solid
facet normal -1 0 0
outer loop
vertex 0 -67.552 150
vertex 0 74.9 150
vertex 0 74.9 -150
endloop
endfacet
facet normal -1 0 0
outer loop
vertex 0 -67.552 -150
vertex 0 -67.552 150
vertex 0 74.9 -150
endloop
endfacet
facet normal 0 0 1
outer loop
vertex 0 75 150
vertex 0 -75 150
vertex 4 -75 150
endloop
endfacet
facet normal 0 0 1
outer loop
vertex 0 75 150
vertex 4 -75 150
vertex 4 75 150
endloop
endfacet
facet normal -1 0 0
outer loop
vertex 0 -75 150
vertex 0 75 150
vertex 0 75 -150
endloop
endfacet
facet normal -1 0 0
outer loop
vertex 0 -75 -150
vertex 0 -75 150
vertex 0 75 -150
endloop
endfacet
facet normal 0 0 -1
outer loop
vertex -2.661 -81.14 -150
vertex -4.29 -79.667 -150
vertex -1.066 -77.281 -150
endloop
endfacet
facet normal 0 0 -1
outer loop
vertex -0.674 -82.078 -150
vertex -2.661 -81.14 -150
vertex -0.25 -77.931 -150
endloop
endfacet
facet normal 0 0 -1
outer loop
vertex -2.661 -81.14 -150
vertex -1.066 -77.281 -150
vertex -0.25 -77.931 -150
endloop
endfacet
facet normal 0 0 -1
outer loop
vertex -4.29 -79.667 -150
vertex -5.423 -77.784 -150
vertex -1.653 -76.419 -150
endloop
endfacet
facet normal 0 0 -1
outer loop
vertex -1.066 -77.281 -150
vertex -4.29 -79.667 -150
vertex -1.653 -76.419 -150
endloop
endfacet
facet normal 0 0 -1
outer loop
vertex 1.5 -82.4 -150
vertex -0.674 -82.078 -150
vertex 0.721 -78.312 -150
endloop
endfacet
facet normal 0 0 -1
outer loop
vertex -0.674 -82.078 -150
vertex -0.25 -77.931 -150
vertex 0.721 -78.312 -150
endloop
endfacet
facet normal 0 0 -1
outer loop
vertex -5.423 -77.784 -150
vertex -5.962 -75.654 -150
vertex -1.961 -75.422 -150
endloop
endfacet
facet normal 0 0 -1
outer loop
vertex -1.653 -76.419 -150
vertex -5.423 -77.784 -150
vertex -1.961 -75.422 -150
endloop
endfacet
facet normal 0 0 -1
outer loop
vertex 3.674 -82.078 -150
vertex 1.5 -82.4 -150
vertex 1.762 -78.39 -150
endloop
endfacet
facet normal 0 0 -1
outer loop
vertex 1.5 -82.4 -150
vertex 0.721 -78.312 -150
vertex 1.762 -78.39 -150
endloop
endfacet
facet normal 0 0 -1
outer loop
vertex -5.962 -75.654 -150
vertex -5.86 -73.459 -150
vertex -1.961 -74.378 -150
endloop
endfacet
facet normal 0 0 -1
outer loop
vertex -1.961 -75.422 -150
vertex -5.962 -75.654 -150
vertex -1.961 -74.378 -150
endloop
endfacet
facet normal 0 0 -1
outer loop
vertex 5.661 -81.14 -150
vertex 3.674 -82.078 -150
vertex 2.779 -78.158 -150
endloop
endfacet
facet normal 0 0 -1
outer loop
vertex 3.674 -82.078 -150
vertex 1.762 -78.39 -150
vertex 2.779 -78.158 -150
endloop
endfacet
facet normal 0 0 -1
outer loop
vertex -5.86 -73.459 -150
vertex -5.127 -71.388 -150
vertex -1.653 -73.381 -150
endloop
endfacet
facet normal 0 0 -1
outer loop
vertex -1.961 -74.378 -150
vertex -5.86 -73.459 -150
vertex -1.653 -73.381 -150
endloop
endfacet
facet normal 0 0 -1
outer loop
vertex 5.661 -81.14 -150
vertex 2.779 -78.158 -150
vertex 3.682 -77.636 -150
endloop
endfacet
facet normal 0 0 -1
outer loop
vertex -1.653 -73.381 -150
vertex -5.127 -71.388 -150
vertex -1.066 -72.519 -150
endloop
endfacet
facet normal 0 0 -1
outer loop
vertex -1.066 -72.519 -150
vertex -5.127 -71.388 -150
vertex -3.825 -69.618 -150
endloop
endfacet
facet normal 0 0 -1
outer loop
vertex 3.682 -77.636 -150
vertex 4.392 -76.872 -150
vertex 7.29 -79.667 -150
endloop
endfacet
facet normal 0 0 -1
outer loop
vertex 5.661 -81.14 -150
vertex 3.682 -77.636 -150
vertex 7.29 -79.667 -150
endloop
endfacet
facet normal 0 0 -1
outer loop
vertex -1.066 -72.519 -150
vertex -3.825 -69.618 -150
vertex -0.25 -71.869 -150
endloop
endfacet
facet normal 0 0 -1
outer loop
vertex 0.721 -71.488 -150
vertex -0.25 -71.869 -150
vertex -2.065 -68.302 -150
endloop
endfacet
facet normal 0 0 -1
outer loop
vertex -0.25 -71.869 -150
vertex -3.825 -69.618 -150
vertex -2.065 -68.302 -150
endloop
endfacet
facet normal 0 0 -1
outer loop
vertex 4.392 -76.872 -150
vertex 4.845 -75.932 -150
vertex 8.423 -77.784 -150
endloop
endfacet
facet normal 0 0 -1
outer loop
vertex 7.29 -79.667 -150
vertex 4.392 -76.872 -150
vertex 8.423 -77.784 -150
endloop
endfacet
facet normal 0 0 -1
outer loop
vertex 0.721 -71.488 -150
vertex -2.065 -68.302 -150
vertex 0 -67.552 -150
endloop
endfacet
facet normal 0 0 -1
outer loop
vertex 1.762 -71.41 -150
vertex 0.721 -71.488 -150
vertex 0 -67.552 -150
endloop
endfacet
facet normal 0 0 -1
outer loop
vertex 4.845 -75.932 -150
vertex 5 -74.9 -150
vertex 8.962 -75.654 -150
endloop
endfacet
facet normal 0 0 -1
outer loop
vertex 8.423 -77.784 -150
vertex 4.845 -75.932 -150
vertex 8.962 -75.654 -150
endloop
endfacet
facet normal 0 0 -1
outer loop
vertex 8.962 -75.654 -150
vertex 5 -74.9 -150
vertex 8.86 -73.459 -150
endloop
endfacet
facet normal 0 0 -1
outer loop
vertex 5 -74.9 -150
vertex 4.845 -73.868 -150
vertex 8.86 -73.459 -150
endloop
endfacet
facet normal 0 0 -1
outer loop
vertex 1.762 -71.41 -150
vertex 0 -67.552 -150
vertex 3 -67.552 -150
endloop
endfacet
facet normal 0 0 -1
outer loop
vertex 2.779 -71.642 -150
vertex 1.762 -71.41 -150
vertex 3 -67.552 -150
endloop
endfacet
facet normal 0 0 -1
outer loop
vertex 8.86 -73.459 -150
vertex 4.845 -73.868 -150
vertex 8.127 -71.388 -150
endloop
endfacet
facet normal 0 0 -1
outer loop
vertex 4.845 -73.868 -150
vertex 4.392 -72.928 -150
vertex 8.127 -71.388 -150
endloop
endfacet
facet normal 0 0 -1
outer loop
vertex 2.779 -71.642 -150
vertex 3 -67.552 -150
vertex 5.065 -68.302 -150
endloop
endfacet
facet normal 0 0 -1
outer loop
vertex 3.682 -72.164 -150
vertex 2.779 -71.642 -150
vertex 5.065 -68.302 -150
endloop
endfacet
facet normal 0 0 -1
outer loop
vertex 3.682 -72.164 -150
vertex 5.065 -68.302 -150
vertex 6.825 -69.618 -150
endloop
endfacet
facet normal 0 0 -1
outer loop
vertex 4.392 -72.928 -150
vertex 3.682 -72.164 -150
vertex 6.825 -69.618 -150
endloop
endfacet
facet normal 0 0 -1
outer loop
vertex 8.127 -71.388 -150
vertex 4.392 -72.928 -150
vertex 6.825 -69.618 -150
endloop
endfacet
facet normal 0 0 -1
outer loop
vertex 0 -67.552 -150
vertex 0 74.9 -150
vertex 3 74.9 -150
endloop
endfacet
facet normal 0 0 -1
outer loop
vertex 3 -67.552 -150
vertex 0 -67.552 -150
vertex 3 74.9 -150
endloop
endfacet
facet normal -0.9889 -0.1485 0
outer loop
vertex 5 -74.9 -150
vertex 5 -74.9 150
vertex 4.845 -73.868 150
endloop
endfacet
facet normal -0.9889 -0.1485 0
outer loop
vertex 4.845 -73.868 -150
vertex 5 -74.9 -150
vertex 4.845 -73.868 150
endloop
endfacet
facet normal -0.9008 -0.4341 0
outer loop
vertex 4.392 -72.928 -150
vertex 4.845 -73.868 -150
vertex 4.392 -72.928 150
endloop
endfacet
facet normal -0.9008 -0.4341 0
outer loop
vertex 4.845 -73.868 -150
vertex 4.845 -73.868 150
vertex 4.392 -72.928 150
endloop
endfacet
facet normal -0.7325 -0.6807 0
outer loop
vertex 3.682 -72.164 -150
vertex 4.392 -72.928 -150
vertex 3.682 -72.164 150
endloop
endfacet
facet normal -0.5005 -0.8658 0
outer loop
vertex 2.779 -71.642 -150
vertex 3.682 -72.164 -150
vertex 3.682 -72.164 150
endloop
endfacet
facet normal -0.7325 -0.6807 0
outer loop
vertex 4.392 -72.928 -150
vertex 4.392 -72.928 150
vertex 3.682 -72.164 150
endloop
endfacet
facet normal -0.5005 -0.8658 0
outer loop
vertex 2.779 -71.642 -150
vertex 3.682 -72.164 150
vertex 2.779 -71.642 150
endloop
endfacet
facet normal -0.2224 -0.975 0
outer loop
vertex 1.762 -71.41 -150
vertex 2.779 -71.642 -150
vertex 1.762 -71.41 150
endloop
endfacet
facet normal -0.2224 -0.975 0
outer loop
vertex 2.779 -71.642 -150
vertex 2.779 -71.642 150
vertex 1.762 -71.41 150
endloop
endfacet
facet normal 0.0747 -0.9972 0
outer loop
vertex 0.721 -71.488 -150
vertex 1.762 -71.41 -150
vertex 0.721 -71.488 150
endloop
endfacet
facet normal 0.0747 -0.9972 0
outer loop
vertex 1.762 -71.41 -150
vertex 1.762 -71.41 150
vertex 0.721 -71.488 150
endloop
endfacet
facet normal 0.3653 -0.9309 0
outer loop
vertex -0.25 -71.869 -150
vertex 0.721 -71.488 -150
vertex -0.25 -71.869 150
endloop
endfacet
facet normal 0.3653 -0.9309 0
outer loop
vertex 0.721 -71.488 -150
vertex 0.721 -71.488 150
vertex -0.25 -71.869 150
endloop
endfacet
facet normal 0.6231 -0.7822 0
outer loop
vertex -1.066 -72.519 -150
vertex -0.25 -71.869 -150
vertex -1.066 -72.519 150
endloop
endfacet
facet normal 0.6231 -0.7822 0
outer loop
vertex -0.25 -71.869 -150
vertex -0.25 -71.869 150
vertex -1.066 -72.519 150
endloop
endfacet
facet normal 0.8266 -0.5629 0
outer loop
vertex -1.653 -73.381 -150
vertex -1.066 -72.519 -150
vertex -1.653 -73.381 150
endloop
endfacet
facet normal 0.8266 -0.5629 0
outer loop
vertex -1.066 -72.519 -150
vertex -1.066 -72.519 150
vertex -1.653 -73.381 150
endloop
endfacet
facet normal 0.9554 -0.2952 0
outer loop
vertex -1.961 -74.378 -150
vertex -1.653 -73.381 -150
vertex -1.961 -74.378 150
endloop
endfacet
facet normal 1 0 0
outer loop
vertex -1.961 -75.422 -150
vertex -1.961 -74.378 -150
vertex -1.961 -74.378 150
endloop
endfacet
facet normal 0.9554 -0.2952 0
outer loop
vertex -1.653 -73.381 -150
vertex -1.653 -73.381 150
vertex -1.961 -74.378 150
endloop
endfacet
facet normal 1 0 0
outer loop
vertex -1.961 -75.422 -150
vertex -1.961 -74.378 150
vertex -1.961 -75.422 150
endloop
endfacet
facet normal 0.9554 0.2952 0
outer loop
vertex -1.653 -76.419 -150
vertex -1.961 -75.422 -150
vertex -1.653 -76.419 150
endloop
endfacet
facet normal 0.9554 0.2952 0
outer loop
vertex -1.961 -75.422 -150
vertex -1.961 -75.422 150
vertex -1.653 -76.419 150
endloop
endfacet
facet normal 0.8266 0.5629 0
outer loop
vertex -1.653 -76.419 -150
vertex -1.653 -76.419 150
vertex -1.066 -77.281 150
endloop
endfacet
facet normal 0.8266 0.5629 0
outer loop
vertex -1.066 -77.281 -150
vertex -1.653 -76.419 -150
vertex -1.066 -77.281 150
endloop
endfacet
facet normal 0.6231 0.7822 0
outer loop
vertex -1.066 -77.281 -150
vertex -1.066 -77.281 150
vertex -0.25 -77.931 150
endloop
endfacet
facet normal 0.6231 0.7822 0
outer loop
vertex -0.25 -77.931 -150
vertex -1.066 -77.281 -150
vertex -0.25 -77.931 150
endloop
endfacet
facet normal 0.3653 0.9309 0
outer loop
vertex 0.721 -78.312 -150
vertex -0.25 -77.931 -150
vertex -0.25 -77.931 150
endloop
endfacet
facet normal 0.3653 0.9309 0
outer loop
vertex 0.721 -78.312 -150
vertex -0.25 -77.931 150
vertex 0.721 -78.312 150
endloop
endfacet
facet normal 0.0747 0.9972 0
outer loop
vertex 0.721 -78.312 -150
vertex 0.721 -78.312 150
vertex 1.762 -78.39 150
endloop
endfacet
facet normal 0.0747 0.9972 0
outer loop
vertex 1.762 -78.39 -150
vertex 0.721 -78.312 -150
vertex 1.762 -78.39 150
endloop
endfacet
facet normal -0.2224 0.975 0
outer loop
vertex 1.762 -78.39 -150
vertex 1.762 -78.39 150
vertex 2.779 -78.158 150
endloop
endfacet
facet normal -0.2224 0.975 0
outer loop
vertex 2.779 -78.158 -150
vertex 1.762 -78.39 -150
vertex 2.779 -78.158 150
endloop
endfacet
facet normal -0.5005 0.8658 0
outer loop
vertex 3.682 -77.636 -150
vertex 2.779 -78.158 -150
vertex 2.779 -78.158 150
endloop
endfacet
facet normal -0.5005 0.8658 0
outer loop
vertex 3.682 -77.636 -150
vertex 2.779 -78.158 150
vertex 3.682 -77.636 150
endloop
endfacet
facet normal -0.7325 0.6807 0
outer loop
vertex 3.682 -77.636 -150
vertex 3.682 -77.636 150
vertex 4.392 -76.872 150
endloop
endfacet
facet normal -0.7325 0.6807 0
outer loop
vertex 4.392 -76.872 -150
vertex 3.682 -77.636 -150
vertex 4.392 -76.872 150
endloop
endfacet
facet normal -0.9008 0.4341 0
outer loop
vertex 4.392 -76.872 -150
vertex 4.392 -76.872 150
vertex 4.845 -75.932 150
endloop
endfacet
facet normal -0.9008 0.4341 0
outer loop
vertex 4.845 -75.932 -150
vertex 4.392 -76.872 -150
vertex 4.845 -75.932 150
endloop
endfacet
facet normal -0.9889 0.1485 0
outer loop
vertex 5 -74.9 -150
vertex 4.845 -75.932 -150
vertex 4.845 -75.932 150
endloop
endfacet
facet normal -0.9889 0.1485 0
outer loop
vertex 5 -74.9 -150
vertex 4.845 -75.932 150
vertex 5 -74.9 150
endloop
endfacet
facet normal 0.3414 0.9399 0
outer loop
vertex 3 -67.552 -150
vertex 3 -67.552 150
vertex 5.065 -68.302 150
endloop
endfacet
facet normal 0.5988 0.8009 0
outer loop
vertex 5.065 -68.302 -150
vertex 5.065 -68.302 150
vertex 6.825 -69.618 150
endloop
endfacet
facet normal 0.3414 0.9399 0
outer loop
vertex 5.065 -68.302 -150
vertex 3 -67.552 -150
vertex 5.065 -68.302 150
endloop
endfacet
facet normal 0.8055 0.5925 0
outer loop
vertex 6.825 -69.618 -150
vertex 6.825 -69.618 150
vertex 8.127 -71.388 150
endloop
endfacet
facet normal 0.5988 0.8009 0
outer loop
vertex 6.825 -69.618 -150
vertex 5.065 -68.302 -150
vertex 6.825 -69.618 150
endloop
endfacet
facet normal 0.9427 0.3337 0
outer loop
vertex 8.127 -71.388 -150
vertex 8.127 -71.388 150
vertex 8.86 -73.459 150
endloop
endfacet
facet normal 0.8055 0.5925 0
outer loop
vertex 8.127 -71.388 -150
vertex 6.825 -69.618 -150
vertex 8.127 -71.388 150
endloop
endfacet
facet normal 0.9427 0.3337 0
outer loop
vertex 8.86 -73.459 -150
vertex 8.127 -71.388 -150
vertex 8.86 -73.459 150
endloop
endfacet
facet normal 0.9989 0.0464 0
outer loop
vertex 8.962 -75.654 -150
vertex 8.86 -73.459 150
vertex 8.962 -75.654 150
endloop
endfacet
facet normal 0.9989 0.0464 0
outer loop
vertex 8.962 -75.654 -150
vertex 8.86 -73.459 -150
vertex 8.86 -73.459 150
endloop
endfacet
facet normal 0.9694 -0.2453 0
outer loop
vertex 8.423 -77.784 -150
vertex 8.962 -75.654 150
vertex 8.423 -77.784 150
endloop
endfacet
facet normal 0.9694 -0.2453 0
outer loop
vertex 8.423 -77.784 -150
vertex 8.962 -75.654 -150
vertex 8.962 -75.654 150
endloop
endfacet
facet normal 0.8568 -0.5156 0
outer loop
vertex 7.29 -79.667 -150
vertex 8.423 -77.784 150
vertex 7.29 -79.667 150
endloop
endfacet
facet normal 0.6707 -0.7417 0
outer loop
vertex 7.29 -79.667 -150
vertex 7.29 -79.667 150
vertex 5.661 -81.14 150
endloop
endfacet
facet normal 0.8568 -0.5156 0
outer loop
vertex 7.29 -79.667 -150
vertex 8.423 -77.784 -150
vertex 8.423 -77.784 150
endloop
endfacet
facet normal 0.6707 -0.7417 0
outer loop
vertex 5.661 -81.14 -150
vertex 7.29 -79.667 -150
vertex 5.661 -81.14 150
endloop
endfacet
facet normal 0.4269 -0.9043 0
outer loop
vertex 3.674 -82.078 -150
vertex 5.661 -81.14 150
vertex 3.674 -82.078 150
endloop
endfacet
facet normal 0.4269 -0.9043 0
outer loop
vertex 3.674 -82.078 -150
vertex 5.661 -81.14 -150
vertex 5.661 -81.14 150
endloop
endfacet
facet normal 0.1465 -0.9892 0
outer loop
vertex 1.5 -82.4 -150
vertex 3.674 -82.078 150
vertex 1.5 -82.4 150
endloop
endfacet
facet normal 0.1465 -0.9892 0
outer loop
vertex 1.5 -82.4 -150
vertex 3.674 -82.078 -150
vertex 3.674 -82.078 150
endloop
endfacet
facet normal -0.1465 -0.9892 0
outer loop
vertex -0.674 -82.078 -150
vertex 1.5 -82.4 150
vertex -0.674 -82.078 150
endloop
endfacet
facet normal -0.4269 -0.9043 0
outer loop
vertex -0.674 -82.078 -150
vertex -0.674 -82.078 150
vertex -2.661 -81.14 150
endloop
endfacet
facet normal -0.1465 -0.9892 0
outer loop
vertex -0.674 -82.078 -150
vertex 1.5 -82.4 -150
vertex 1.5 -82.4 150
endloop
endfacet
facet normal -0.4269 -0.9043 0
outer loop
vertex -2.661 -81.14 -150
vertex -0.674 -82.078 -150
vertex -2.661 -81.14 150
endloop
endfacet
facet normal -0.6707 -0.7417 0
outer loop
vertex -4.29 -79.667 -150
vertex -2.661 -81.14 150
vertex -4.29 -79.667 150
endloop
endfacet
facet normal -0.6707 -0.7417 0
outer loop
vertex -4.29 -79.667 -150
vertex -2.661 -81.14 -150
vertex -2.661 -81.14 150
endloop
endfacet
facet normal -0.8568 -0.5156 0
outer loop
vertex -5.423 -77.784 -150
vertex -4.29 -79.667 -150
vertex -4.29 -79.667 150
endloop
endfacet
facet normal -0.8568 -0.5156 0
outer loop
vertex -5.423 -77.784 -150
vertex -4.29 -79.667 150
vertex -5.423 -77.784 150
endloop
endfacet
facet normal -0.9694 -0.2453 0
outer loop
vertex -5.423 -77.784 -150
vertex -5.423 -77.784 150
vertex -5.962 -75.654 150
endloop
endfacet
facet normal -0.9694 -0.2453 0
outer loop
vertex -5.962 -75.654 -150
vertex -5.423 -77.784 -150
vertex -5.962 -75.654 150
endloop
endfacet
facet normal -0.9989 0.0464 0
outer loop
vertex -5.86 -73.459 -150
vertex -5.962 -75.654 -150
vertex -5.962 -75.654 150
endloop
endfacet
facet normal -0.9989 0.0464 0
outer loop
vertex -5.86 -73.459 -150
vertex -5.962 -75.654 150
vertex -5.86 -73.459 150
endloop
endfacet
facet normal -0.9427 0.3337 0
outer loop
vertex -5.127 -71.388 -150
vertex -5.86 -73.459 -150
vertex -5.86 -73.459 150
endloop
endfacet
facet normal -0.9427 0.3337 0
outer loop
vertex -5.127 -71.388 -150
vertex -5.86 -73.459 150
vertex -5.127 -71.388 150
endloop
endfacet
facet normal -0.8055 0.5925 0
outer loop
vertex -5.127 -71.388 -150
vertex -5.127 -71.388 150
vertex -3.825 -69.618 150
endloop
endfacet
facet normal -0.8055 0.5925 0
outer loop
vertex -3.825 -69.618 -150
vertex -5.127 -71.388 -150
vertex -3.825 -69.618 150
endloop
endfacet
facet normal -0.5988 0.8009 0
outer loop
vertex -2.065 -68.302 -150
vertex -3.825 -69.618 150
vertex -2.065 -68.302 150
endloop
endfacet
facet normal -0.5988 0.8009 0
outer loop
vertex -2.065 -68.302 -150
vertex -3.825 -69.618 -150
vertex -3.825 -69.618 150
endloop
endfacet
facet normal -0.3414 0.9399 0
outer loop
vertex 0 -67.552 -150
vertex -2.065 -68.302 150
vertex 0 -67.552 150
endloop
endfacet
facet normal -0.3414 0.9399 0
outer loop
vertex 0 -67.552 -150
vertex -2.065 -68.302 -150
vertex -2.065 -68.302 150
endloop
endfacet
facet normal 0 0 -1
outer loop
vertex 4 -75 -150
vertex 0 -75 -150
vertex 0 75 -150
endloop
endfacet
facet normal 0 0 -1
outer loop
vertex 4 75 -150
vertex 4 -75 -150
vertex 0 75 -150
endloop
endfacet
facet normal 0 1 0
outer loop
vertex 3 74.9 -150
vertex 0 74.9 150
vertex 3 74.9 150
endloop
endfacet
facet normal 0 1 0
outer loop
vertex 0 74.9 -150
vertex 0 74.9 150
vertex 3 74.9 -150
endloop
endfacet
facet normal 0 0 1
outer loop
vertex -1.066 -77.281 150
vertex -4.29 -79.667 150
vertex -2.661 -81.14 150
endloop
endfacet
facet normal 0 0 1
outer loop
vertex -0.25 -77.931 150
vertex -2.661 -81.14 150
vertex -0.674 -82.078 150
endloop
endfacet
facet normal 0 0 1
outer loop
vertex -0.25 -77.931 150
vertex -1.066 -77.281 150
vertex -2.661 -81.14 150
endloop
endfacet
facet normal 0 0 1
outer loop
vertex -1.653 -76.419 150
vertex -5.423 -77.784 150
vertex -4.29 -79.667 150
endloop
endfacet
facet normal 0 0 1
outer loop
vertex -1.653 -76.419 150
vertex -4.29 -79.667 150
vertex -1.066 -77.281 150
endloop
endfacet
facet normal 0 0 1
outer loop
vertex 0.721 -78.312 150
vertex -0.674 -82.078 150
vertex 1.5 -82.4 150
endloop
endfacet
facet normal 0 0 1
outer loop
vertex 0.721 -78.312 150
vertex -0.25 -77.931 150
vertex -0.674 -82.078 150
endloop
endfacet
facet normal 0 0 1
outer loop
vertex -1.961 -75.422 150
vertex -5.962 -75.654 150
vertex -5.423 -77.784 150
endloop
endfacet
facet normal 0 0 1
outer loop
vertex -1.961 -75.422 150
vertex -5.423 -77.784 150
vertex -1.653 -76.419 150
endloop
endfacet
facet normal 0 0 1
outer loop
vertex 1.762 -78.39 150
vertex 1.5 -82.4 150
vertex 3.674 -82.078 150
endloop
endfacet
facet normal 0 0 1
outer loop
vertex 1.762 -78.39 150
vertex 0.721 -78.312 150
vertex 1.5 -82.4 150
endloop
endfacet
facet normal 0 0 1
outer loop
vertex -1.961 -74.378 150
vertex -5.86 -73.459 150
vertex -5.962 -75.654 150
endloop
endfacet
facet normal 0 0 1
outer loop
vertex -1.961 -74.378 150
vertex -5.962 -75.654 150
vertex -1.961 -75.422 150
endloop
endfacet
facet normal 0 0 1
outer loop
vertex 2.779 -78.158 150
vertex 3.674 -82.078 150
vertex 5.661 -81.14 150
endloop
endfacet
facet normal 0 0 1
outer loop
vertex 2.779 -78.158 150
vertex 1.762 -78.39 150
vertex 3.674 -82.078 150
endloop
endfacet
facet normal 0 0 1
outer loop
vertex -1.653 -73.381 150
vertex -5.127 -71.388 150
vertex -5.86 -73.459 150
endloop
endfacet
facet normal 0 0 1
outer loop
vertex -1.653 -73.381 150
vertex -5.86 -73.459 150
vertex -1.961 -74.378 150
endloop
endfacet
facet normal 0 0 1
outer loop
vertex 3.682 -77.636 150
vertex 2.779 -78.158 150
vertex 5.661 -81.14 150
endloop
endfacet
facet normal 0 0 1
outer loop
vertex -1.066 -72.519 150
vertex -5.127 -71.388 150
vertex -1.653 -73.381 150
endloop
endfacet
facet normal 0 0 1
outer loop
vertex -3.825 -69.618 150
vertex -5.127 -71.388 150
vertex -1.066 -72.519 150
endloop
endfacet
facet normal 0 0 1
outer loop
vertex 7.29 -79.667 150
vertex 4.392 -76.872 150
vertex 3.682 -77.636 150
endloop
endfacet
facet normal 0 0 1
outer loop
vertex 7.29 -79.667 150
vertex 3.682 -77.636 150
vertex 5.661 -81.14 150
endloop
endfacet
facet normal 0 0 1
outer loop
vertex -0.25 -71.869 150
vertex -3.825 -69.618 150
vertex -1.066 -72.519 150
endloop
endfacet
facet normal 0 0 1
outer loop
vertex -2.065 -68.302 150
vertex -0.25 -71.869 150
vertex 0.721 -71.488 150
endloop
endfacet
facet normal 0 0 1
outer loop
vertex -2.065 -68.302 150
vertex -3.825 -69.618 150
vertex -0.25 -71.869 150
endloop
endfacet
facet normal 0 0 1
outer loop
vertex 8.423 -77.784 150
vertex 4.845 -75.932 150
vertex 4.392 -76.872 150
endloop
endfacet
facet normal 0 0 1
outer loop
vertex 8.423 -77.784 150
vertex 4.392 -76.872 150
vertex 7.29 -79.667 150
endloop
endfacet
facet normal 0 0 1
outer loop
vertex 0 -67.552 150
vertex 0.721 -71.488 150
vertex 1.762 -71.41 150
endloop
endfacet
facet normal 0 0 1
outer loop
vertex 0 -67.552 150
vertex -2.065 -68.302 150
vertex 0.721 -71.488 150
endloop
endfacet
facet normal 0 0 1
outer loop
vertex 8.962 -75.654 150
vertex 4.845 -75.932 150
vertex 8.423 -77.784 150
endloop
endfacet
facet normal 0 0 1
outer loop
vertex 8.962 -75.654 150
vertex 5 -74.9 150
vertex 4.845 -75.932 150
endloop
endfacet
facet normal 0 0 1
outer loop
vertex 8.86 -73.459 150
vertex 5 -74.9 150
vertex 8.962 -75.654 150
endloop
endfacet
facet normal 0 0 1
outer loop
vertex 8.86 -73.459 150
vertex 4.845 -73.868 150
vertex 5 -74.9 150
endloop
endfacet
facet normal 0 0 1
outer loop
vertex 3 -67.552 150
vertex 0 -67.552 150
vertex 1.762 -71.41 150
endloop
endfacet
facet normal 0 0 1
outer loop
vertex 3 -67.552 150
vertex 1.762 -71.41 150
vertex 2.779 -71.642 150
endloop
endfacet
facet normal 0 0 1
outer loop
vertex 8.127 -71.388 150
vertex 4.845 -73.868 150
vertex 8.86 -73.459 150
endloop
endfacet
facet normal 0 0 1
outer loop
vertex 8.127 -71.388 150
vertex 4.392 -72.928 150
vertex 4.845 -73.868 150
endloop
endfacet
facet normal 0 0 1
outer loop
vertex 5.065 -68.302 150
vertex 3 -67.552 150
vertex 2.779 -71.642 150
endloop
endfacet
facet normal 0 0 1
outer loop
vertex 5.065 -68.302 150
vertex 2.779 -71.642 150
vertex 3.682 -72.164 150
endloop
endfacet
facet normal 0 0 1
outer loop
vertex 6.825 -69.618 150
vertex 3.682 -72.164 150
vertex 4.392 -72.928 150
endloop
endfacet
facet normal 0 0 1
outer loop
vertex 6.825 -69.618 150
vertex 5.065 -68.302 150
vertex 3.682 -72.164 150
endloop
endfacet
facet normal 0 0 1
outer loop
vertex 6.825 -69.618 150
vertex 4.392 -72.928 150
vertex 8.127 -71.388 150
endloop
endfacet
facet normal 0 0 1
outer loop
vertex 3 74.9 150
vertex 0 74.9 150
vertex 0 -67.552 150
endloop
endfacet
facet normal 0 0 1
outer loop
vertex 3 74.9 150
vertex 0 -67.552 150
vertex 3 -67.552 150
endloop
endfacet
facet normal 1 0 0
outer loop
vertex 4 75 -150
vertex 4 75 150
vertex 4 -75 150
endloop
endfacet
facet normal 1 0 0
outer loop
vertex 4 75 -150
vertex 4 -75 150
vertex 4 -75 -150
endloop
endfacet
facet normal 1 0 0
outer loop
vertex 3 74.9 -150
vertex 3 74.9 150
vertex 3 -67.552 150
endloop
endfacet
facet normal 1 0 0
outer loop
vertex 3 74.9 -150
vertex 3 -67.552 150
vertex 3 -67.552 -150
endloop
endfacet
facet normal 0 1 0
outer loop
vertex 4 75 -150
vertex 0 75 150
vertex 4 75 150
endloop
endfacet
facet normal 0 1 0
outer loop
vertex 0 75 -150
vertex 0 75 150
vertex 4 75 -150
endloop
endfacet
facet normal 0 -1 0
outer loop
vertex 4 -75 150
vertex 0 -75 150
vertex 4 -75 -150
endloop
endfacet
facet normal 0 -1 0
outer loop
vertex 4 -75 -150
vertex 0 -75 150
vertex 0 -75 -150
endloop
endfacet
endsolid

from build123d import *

# Parameters (mm, degrees)
SCHIZZO1_W                   = 300
SCHIZZO1_H                   = 149.8
ESTRUSIONE_ESTRUSIONE1_DEPTH = 3
SCHIZZO2_R                   = 7.5
SCHIZZO3_R                   = 3.5
TAGLIO_ESTRUSIONE1_DEPTH     = 312.240678575
SCHIZZO4_W                   = 300
SCHIZZO4_H                   = 150
ESTRUSIONE_ESTRUSIONE2_DEPTH = 4


with BuildPart() as part:
    # Schizzo1 → Estrusione-Estrusione1 (new body)
    with BuildSketch(Plane(origin=(0, 0, 0), x_dir=(0, 0, -1), z_dir=(1, 0, 0))):
        Rectangle(SCHIZZO1_W, SCHIZZO1_H)
    extrude(amount=ESTRUSIONE_ESTRUSIONE1_DEPTH)

    # Sweep1: sweep along a curve in space
    with BuildLine() as sweep1_path:
        Line((3, -74.9, 150), (3, -74.9, -150))
    # Schizzo2 → Sweep1 (sweep)
    with BuildSketch(Plane.XY.offset(150)):
        with Locations((1.5, -74.9)):
            Circle(SCHIZZO2_R)
    sweep(path=sweep1_path.line)

    # Schizzo3 → Taglio-Estrusione1 (cut, through all)
    with BuildSketch(Plane.XY.offset(150)):
        with Locations((1.5, -74.9)):
            Circle(SCHIZZO3_R)
    extrude(amount=-TAGLIO_ESTRUSIONE1_DEPTH, mode=Mode.SUBTRACT)


with BuildPart() as body_2:
    # Schizzo4 → Estrusione-Estrusione2 (new body)
    with BuildSketch(Plane(origin=(0, 0, 0), x_dir=(0, 0, -1), z_dir=(1, 0, 0))):
        Rectangle(SCHIZZO4_W, SCHIZZO4_H)
    extrude(amount=ESTRUSIONE_ESTRUSIONE2_DEPTH)


solid = Compound([part.part, body_2.part])
